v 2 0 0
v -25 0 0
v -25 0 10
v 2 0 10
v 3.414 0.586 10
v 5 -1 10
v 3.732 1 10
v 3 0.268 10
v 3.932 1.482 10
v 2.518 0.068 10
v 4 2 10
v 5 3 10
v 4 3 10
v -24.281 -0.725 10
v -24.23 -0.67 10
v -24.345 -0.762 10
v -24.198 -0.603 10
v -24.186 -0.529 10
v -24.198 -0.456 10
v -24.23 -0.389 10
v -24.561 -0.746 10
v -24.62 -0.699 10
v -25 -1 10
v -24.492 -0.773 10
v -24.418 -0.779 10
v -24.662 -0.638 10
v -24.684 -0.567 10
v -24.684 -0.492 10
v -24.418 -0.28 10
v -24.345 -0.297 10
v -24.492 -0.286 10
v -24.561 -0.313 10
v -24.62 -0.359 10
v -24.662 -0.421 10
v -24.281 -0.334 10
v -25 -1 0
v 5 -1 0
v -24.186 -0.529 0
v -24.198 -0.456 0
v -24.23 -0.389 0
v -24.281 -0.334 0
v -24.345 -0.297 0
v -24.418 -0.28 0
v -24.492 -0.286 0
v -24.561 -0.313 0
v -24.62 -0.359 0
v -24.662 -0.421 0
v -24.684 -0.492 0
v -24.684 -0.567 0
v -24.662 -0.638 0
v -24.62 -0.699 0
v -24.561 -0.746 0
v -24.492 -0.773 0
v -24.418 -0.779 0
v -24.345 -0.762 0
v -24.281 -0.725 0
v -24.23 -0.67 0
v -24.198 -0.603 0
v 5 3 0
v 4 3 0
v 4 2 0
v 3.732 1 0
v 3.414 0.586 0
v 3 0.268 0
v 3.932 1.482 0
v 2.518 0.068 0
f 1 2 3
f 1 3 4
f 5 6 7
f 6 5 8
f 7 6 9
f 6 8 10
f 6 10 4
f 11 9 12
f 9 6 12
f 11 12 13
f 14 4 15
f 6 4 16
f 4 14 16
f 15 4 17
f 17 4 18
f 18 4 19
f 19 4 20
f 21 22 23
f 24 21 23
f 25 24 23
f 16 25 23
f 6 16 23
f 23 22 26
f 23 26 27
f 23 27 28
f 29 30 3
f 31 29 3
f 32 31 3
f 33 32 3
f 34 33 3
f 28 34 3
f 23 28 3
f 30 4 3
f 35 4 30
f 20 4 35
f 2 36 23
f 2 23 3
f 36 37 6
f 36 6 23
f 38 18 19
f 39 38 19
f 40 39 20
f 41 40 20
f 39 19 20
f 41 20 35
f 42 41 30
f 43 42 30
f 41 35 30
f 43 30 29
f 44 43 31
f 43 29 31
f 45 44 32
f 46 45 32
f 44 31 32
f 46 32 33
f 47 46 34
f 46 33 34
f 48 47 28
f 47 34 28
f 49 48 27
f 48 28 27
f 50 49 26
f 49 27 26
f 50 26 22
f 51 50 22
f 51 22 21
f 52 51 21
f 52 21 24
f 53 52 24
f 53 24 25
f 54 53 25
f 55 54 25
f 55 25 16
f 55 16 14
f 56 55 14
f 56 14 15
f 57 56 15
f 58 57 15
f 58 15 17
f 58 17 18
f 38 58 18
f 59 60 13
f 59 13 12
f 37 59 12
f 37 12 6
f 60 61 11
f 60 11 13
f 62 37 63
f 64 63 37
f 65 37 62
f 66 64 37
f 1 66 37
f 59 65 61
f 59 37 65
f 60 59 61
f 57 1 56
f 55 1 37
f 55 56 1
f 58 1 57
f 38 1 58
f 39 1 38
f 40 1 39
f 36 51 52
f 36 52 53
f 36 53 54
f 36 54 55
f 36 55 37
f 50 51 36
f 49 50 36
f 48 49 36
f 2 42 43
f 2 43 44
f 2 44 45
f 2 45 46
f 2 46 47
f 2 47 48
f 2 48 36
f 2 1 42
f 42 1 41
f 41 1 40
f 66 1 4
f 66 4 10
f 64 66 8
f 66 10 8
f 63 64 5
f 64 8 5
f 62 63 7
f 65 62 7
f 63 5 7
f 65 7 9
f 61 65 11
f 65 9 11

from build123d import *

# Parameters (mm, degrees)
BOSS_EXTRUDE1_DEPTH = 10
FILLET1_R           = 2
SKETCH3_R           = 0.25
CUT_EXTRUDE1_DEPTH  = 11


with BuildPart() as part:
    # Sketch1 → Boss-Extrude1 (new body)
    with BuildSketch(Plane.XY):
        Polygon((4, 3), (5, 3), (5, -1), (-25, -1), (-25, 0), (4, 0), align=None)
    extrude(amount=BOSS_EXTRUDE1_DEPTH)

    # Fillet1
    fillet1_edges = [part.edges().sort_by_distance(p)[0] for p in [
        (4, 0, 5),
    ]]
    fillet(fillet1_edges, radius=FILLET1_R)

    # Sketch3 → Cut-Extrude1 (cut, through all)
    with BuildSketch(Plane.XY.offset(10)):
        with Locations((-24.436460419, -0.529384592)):
            Circle(SKETCH3_R)
    extrude(amount=-CUT_EXTRUDE1_DEPTH, mode=Mode.SUBTRACT)


solid = part.part
